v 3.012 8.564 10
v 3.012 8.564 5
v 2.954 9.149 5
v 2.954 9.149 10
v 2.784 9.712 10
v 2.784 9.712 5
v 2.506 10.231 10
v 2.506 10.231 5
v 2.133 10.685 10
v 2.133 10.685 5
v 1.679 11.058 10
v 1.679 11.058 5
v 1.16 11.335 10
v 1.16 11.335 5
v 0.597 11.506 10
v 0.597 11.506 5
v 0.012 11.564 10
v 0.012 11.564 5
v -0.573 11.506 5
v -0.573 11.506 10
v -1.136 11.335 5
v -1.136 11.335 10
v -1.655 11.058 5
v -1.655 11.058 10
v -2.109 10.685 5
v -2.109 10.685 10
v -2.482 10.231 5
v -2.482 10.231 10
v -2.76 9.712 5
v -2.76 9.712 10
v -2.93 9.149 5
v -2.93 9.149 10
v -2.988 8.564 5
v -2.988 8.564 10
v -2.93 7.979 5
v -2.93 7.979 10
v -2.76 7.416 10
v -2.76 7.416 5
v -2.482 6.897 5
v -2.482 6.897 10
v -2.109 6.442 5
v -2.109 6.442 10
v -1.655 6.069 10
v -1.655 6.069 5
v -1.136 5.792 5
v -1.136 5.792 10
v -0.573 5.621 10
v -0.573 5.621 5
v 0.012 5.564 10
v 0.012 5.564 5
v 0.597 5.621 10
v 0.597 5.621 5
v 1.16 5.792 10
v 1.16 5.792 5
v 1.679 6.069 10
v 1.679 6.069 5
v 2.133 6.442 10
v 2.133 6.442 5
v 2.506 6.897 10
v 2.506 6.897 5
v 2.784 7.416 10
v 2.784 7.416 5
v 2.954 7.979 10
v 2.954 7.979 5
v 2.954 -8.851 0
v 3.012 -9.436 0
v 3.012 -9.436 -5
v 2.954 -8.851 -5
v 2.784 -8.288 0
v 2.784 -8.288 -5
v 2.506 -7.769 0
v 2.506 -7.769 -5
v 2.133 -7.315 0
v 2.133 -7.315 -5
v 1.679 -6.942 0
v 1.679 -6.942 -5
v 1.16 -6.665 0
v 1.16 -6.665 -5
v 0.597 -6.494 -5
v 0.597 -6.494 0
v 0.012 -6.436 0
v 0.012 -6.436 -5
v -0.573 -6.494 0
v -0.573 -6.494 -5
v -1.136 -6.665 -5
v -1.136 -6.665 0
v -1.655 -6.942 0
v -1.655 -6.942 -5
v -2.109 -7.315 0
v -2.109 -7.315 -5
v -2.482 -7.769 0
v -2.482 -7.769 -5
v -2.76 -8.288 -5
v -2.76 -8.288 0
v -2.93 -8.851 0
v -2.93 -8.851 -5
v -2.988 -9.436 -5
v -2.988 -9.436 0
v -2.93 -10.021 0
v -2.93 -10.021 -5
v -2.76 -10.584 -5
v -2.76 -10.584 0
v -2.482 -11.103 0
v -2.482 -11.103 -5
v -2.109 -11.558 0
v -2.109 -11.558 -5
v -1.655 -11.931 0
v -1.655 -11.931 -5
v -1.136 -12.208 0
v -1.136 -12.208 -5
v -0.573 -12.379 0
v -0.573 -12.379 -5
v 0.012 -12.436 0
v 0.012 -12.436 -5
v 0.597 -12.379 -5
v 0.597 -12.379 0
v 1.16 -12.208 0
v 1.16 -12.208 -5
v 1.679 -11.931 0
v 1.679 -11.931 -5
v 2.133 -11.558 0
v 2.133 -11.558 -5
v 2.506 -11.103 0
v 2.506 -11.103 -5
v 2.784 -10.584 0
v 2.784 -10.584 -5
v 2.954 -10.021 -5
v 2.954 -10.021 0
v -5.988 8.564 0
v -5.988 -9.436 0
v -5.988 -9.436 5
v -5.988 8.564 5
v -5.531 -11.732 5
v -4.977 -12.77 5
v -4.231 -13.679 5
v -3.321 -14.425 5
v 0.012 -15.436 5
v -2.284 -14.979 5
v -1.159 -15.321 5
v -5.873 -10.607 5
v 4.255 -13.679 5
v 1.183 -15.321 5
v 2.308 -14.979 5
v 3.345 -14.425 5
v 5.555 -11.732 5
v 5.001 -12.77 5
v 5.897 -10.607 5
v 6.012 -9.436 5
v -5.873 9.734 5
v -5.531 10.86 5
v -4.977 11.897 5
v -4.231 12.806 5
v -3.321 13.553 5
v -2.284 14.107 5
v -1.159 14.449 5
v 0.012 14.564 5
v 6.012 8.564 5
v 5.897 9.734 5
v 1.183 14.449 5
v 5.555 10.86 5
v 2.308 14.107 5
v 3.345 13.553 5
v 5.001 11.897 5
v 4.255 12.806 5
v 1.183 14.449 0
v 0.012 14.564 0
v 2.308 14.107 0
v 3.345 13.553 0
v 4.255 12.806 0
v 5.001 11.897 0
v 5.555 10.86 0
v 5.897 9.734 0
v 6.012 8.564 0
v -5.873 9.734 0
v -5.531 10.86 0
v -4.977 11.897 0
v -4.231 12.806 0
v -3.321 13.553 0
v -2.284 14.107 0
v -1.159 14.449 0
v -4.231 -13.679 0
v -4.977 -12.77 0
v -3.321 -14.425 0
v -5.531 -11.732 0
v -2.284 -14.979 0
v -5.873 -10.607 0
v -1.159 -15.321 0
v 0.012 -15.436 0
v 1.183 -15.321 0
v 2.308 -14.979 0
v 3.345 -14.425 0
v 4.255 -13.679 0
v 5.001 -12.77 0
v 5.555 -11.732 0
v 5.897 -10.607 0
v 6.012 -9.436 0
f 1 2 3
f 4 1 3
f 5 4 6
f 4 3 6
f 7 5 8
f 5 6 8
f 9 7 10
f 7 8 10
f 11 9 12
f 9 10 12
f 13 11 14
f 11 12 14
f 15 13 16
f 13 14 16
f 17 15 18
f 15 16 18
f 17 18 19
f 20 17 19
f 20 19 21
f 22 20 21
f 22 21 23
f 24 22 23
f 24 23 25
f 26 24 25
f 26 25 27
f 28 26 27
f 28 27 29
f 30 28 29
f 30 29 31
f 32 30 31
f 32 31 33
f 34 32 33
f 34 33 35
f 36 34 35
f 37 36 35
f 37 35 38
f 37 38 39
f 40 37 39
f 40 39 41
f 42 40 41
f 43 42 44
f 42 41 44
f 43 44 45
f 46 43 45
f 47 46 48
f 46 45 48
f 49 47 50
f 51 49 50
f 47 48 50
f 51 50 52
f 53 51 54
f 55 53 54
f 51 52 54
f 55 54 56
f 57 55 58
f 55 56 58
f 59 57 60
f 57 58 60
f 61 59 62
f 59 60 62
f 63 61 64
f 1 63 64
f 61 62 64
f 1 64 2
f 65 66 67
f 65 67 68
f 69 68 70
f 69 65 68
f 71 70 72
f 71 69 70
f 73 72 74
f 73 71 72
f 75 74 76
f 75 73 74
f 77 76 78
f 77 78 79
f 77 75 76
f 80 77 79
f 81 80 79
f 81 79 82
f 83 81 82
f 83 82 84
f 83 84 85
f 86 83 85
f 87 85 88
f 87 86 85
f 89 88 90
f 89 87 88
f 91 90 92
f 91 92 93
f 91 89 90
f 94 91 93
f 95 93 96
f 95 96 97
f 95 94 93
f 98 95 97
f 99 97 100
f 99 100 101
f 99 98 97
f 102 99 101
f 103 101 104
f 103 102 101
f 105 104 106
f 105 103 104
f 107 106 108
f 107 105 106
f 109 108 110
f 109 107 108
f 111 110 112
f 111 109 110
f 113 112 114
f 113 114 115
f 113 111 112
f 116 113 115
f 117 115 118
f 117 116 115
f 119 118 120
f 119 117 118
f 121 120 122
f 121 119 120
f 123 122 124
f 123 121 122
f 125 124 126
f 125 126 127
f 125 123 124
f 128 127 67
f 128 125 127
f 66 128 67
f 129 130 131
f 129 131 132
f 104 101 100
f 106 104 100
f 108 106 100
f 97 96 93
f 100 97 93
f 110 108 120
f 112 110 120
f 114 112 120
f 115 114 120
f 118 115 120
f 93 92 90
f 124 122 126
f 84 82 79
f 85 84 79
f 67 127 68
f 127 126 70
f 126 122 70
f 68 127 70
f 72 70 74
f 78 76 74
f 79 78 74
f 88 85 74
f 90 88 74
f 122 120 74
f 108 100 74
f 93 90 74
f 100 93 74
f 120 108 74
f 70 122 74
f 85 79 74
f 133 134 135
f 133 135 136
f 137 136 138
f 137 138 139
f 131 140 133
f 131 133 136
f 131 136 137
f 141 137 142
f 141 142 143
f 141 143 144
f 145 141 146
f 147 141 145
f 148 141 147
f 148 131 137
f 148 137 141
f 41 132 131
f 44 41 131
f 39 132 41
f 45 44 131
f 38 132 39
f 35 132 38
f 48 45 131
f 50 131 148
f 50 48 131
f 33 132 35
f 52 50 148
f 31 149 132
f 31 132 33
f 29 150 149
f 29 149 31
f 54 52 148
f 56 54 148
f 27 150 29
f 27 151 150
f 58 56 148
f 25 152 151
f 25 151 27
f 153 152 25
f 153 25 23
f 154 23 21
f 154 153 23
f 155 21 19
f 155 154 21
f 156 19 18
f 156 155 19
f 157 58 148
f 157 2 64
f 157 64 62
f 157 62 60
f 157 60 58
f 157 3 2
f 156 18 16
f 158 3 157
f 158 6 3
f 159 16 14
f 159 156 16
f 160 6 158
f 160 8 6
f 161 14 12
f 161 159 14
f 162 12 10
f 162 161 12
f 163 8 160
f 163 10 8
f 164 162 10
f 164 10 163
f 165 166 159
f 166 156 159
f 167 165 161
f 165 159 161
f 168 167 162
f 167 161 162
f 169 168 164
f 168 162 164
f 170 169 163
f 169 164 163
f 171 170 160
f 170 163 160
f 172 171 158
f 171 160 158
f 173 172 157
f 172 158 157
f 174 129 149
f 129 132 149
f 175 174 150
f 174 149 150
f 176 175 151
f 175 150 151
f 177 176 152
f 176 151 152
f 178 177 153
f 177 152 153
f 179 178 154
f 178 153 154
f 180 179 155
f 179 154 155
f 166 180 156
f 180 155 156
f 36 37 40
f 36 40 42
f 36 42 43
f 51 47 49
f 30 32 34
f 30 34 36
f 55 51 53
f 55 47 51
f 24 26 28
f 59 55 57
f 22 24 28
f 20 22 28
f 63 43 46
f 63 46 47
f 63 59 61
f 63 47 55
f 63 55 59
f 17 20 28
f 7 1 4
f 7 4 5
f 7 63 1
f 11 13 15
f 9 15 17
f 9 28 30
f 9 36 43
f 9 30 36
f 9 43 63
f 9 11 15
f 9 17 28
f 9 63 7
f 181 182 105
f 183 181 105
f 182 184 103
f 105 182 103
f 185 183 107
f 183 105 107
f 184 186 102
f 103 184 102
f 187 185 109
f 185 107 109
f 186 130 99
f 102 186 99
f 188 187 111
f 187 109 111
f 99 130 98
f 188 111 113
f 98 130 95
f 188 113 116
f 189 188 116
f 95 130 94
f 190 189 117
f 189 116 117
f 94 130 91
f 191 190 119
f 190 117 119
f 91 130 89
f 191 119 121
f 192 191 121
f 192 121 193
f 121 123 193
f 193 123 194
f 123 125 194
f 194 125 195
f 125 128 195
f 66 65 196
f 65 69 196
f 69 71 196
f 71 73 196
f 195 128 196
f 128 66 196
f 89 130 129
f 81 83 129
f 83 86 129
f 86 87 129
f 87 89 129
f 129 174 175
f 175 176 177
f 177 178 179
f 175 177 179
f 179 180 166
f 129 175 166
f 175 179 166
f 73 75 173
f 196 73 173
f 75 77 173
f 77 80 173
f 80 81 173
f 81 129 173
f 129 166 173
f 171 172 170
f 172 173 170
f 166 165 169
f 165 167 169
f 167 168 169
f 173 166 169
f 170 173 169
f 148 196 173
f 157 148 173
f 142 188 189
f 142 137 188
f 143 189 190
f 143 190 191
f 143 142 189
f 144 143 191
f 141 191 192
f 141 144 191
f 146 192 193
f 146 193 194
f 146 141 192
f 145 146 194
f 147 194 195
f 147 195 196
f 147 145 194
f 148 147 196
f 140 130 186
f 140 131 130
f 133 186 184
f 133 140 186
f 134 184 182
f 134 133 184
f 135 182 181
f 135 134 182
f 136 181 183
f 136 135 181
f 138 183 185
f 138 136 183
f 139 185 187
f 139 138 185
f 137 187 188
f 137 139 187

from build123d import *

# Parameters (mm, degrees)
F0_W     = 12
F0_H     = 30
F0_R     = 3
F1_DEPTH = 5
F2_DEPTH = 10
F3_DEPTH = 5
F4_R     = 5.99999


# Not quite as in the source:
# - a fillet or chamfer is up to 0.001 mm smaller than in the source, because OpenCascade refuses the exact size


with BuildPart() as f1:
    # F0 (on Top) → F1 (new body)
    with BuildSketch(Plane.XY):
        with Locations((0.0119865412, -0.4361811298)):
            Rectangle(F0_W, F0_H)
        with Locations((0.0119865412, -9.4361811298)):
            Circle(F0_R, mode=Mode.SUBTRACT)
        with Locations((0.0119865412, 8.5638188702)):
            Circle(F0_R, mode=Mode.SUBTRACT)
        with Locations((0.0119865412, 8.5638188702)):
            Circle(F0_R)
        with Locations((0.0119865412, -9.4361811298)):
            Circle(F0_R)
    extrude(amount=F1_DEPTH)

    # F0 (on Top) → F2 (join)
    with BuildSketch(Plane.XY):
        with Locations((0.0119865412, 8.5638188702)):
            Circle(F0_R)
    extrude(amount=F2_DEPTH)

    # F0 (on Top) → F3 (join)
    with BuildSketch(Plane.XY):
        with Locations((0.0119865412, -9.4361811298)):
            Circle(F0_R)
    extrude(amount=-F3_DEPTH)

    # F4 (radius 6 in the source; OpenCascade refuses exactly that, so slightly less here)
    f4_edges = [f1.edges().sort_by_distance(p)[0] for p in [
        (6.011987, 14.563819, 2.5),
        (-5.988013, 14.563819, 2.5),
        (6.011987, -15.436181, 2.5),
        (-5.988013, -15.436181, 2.5),
    ]]
    fillet(f4_edges, radius=F4_R)


solid = f1.part
